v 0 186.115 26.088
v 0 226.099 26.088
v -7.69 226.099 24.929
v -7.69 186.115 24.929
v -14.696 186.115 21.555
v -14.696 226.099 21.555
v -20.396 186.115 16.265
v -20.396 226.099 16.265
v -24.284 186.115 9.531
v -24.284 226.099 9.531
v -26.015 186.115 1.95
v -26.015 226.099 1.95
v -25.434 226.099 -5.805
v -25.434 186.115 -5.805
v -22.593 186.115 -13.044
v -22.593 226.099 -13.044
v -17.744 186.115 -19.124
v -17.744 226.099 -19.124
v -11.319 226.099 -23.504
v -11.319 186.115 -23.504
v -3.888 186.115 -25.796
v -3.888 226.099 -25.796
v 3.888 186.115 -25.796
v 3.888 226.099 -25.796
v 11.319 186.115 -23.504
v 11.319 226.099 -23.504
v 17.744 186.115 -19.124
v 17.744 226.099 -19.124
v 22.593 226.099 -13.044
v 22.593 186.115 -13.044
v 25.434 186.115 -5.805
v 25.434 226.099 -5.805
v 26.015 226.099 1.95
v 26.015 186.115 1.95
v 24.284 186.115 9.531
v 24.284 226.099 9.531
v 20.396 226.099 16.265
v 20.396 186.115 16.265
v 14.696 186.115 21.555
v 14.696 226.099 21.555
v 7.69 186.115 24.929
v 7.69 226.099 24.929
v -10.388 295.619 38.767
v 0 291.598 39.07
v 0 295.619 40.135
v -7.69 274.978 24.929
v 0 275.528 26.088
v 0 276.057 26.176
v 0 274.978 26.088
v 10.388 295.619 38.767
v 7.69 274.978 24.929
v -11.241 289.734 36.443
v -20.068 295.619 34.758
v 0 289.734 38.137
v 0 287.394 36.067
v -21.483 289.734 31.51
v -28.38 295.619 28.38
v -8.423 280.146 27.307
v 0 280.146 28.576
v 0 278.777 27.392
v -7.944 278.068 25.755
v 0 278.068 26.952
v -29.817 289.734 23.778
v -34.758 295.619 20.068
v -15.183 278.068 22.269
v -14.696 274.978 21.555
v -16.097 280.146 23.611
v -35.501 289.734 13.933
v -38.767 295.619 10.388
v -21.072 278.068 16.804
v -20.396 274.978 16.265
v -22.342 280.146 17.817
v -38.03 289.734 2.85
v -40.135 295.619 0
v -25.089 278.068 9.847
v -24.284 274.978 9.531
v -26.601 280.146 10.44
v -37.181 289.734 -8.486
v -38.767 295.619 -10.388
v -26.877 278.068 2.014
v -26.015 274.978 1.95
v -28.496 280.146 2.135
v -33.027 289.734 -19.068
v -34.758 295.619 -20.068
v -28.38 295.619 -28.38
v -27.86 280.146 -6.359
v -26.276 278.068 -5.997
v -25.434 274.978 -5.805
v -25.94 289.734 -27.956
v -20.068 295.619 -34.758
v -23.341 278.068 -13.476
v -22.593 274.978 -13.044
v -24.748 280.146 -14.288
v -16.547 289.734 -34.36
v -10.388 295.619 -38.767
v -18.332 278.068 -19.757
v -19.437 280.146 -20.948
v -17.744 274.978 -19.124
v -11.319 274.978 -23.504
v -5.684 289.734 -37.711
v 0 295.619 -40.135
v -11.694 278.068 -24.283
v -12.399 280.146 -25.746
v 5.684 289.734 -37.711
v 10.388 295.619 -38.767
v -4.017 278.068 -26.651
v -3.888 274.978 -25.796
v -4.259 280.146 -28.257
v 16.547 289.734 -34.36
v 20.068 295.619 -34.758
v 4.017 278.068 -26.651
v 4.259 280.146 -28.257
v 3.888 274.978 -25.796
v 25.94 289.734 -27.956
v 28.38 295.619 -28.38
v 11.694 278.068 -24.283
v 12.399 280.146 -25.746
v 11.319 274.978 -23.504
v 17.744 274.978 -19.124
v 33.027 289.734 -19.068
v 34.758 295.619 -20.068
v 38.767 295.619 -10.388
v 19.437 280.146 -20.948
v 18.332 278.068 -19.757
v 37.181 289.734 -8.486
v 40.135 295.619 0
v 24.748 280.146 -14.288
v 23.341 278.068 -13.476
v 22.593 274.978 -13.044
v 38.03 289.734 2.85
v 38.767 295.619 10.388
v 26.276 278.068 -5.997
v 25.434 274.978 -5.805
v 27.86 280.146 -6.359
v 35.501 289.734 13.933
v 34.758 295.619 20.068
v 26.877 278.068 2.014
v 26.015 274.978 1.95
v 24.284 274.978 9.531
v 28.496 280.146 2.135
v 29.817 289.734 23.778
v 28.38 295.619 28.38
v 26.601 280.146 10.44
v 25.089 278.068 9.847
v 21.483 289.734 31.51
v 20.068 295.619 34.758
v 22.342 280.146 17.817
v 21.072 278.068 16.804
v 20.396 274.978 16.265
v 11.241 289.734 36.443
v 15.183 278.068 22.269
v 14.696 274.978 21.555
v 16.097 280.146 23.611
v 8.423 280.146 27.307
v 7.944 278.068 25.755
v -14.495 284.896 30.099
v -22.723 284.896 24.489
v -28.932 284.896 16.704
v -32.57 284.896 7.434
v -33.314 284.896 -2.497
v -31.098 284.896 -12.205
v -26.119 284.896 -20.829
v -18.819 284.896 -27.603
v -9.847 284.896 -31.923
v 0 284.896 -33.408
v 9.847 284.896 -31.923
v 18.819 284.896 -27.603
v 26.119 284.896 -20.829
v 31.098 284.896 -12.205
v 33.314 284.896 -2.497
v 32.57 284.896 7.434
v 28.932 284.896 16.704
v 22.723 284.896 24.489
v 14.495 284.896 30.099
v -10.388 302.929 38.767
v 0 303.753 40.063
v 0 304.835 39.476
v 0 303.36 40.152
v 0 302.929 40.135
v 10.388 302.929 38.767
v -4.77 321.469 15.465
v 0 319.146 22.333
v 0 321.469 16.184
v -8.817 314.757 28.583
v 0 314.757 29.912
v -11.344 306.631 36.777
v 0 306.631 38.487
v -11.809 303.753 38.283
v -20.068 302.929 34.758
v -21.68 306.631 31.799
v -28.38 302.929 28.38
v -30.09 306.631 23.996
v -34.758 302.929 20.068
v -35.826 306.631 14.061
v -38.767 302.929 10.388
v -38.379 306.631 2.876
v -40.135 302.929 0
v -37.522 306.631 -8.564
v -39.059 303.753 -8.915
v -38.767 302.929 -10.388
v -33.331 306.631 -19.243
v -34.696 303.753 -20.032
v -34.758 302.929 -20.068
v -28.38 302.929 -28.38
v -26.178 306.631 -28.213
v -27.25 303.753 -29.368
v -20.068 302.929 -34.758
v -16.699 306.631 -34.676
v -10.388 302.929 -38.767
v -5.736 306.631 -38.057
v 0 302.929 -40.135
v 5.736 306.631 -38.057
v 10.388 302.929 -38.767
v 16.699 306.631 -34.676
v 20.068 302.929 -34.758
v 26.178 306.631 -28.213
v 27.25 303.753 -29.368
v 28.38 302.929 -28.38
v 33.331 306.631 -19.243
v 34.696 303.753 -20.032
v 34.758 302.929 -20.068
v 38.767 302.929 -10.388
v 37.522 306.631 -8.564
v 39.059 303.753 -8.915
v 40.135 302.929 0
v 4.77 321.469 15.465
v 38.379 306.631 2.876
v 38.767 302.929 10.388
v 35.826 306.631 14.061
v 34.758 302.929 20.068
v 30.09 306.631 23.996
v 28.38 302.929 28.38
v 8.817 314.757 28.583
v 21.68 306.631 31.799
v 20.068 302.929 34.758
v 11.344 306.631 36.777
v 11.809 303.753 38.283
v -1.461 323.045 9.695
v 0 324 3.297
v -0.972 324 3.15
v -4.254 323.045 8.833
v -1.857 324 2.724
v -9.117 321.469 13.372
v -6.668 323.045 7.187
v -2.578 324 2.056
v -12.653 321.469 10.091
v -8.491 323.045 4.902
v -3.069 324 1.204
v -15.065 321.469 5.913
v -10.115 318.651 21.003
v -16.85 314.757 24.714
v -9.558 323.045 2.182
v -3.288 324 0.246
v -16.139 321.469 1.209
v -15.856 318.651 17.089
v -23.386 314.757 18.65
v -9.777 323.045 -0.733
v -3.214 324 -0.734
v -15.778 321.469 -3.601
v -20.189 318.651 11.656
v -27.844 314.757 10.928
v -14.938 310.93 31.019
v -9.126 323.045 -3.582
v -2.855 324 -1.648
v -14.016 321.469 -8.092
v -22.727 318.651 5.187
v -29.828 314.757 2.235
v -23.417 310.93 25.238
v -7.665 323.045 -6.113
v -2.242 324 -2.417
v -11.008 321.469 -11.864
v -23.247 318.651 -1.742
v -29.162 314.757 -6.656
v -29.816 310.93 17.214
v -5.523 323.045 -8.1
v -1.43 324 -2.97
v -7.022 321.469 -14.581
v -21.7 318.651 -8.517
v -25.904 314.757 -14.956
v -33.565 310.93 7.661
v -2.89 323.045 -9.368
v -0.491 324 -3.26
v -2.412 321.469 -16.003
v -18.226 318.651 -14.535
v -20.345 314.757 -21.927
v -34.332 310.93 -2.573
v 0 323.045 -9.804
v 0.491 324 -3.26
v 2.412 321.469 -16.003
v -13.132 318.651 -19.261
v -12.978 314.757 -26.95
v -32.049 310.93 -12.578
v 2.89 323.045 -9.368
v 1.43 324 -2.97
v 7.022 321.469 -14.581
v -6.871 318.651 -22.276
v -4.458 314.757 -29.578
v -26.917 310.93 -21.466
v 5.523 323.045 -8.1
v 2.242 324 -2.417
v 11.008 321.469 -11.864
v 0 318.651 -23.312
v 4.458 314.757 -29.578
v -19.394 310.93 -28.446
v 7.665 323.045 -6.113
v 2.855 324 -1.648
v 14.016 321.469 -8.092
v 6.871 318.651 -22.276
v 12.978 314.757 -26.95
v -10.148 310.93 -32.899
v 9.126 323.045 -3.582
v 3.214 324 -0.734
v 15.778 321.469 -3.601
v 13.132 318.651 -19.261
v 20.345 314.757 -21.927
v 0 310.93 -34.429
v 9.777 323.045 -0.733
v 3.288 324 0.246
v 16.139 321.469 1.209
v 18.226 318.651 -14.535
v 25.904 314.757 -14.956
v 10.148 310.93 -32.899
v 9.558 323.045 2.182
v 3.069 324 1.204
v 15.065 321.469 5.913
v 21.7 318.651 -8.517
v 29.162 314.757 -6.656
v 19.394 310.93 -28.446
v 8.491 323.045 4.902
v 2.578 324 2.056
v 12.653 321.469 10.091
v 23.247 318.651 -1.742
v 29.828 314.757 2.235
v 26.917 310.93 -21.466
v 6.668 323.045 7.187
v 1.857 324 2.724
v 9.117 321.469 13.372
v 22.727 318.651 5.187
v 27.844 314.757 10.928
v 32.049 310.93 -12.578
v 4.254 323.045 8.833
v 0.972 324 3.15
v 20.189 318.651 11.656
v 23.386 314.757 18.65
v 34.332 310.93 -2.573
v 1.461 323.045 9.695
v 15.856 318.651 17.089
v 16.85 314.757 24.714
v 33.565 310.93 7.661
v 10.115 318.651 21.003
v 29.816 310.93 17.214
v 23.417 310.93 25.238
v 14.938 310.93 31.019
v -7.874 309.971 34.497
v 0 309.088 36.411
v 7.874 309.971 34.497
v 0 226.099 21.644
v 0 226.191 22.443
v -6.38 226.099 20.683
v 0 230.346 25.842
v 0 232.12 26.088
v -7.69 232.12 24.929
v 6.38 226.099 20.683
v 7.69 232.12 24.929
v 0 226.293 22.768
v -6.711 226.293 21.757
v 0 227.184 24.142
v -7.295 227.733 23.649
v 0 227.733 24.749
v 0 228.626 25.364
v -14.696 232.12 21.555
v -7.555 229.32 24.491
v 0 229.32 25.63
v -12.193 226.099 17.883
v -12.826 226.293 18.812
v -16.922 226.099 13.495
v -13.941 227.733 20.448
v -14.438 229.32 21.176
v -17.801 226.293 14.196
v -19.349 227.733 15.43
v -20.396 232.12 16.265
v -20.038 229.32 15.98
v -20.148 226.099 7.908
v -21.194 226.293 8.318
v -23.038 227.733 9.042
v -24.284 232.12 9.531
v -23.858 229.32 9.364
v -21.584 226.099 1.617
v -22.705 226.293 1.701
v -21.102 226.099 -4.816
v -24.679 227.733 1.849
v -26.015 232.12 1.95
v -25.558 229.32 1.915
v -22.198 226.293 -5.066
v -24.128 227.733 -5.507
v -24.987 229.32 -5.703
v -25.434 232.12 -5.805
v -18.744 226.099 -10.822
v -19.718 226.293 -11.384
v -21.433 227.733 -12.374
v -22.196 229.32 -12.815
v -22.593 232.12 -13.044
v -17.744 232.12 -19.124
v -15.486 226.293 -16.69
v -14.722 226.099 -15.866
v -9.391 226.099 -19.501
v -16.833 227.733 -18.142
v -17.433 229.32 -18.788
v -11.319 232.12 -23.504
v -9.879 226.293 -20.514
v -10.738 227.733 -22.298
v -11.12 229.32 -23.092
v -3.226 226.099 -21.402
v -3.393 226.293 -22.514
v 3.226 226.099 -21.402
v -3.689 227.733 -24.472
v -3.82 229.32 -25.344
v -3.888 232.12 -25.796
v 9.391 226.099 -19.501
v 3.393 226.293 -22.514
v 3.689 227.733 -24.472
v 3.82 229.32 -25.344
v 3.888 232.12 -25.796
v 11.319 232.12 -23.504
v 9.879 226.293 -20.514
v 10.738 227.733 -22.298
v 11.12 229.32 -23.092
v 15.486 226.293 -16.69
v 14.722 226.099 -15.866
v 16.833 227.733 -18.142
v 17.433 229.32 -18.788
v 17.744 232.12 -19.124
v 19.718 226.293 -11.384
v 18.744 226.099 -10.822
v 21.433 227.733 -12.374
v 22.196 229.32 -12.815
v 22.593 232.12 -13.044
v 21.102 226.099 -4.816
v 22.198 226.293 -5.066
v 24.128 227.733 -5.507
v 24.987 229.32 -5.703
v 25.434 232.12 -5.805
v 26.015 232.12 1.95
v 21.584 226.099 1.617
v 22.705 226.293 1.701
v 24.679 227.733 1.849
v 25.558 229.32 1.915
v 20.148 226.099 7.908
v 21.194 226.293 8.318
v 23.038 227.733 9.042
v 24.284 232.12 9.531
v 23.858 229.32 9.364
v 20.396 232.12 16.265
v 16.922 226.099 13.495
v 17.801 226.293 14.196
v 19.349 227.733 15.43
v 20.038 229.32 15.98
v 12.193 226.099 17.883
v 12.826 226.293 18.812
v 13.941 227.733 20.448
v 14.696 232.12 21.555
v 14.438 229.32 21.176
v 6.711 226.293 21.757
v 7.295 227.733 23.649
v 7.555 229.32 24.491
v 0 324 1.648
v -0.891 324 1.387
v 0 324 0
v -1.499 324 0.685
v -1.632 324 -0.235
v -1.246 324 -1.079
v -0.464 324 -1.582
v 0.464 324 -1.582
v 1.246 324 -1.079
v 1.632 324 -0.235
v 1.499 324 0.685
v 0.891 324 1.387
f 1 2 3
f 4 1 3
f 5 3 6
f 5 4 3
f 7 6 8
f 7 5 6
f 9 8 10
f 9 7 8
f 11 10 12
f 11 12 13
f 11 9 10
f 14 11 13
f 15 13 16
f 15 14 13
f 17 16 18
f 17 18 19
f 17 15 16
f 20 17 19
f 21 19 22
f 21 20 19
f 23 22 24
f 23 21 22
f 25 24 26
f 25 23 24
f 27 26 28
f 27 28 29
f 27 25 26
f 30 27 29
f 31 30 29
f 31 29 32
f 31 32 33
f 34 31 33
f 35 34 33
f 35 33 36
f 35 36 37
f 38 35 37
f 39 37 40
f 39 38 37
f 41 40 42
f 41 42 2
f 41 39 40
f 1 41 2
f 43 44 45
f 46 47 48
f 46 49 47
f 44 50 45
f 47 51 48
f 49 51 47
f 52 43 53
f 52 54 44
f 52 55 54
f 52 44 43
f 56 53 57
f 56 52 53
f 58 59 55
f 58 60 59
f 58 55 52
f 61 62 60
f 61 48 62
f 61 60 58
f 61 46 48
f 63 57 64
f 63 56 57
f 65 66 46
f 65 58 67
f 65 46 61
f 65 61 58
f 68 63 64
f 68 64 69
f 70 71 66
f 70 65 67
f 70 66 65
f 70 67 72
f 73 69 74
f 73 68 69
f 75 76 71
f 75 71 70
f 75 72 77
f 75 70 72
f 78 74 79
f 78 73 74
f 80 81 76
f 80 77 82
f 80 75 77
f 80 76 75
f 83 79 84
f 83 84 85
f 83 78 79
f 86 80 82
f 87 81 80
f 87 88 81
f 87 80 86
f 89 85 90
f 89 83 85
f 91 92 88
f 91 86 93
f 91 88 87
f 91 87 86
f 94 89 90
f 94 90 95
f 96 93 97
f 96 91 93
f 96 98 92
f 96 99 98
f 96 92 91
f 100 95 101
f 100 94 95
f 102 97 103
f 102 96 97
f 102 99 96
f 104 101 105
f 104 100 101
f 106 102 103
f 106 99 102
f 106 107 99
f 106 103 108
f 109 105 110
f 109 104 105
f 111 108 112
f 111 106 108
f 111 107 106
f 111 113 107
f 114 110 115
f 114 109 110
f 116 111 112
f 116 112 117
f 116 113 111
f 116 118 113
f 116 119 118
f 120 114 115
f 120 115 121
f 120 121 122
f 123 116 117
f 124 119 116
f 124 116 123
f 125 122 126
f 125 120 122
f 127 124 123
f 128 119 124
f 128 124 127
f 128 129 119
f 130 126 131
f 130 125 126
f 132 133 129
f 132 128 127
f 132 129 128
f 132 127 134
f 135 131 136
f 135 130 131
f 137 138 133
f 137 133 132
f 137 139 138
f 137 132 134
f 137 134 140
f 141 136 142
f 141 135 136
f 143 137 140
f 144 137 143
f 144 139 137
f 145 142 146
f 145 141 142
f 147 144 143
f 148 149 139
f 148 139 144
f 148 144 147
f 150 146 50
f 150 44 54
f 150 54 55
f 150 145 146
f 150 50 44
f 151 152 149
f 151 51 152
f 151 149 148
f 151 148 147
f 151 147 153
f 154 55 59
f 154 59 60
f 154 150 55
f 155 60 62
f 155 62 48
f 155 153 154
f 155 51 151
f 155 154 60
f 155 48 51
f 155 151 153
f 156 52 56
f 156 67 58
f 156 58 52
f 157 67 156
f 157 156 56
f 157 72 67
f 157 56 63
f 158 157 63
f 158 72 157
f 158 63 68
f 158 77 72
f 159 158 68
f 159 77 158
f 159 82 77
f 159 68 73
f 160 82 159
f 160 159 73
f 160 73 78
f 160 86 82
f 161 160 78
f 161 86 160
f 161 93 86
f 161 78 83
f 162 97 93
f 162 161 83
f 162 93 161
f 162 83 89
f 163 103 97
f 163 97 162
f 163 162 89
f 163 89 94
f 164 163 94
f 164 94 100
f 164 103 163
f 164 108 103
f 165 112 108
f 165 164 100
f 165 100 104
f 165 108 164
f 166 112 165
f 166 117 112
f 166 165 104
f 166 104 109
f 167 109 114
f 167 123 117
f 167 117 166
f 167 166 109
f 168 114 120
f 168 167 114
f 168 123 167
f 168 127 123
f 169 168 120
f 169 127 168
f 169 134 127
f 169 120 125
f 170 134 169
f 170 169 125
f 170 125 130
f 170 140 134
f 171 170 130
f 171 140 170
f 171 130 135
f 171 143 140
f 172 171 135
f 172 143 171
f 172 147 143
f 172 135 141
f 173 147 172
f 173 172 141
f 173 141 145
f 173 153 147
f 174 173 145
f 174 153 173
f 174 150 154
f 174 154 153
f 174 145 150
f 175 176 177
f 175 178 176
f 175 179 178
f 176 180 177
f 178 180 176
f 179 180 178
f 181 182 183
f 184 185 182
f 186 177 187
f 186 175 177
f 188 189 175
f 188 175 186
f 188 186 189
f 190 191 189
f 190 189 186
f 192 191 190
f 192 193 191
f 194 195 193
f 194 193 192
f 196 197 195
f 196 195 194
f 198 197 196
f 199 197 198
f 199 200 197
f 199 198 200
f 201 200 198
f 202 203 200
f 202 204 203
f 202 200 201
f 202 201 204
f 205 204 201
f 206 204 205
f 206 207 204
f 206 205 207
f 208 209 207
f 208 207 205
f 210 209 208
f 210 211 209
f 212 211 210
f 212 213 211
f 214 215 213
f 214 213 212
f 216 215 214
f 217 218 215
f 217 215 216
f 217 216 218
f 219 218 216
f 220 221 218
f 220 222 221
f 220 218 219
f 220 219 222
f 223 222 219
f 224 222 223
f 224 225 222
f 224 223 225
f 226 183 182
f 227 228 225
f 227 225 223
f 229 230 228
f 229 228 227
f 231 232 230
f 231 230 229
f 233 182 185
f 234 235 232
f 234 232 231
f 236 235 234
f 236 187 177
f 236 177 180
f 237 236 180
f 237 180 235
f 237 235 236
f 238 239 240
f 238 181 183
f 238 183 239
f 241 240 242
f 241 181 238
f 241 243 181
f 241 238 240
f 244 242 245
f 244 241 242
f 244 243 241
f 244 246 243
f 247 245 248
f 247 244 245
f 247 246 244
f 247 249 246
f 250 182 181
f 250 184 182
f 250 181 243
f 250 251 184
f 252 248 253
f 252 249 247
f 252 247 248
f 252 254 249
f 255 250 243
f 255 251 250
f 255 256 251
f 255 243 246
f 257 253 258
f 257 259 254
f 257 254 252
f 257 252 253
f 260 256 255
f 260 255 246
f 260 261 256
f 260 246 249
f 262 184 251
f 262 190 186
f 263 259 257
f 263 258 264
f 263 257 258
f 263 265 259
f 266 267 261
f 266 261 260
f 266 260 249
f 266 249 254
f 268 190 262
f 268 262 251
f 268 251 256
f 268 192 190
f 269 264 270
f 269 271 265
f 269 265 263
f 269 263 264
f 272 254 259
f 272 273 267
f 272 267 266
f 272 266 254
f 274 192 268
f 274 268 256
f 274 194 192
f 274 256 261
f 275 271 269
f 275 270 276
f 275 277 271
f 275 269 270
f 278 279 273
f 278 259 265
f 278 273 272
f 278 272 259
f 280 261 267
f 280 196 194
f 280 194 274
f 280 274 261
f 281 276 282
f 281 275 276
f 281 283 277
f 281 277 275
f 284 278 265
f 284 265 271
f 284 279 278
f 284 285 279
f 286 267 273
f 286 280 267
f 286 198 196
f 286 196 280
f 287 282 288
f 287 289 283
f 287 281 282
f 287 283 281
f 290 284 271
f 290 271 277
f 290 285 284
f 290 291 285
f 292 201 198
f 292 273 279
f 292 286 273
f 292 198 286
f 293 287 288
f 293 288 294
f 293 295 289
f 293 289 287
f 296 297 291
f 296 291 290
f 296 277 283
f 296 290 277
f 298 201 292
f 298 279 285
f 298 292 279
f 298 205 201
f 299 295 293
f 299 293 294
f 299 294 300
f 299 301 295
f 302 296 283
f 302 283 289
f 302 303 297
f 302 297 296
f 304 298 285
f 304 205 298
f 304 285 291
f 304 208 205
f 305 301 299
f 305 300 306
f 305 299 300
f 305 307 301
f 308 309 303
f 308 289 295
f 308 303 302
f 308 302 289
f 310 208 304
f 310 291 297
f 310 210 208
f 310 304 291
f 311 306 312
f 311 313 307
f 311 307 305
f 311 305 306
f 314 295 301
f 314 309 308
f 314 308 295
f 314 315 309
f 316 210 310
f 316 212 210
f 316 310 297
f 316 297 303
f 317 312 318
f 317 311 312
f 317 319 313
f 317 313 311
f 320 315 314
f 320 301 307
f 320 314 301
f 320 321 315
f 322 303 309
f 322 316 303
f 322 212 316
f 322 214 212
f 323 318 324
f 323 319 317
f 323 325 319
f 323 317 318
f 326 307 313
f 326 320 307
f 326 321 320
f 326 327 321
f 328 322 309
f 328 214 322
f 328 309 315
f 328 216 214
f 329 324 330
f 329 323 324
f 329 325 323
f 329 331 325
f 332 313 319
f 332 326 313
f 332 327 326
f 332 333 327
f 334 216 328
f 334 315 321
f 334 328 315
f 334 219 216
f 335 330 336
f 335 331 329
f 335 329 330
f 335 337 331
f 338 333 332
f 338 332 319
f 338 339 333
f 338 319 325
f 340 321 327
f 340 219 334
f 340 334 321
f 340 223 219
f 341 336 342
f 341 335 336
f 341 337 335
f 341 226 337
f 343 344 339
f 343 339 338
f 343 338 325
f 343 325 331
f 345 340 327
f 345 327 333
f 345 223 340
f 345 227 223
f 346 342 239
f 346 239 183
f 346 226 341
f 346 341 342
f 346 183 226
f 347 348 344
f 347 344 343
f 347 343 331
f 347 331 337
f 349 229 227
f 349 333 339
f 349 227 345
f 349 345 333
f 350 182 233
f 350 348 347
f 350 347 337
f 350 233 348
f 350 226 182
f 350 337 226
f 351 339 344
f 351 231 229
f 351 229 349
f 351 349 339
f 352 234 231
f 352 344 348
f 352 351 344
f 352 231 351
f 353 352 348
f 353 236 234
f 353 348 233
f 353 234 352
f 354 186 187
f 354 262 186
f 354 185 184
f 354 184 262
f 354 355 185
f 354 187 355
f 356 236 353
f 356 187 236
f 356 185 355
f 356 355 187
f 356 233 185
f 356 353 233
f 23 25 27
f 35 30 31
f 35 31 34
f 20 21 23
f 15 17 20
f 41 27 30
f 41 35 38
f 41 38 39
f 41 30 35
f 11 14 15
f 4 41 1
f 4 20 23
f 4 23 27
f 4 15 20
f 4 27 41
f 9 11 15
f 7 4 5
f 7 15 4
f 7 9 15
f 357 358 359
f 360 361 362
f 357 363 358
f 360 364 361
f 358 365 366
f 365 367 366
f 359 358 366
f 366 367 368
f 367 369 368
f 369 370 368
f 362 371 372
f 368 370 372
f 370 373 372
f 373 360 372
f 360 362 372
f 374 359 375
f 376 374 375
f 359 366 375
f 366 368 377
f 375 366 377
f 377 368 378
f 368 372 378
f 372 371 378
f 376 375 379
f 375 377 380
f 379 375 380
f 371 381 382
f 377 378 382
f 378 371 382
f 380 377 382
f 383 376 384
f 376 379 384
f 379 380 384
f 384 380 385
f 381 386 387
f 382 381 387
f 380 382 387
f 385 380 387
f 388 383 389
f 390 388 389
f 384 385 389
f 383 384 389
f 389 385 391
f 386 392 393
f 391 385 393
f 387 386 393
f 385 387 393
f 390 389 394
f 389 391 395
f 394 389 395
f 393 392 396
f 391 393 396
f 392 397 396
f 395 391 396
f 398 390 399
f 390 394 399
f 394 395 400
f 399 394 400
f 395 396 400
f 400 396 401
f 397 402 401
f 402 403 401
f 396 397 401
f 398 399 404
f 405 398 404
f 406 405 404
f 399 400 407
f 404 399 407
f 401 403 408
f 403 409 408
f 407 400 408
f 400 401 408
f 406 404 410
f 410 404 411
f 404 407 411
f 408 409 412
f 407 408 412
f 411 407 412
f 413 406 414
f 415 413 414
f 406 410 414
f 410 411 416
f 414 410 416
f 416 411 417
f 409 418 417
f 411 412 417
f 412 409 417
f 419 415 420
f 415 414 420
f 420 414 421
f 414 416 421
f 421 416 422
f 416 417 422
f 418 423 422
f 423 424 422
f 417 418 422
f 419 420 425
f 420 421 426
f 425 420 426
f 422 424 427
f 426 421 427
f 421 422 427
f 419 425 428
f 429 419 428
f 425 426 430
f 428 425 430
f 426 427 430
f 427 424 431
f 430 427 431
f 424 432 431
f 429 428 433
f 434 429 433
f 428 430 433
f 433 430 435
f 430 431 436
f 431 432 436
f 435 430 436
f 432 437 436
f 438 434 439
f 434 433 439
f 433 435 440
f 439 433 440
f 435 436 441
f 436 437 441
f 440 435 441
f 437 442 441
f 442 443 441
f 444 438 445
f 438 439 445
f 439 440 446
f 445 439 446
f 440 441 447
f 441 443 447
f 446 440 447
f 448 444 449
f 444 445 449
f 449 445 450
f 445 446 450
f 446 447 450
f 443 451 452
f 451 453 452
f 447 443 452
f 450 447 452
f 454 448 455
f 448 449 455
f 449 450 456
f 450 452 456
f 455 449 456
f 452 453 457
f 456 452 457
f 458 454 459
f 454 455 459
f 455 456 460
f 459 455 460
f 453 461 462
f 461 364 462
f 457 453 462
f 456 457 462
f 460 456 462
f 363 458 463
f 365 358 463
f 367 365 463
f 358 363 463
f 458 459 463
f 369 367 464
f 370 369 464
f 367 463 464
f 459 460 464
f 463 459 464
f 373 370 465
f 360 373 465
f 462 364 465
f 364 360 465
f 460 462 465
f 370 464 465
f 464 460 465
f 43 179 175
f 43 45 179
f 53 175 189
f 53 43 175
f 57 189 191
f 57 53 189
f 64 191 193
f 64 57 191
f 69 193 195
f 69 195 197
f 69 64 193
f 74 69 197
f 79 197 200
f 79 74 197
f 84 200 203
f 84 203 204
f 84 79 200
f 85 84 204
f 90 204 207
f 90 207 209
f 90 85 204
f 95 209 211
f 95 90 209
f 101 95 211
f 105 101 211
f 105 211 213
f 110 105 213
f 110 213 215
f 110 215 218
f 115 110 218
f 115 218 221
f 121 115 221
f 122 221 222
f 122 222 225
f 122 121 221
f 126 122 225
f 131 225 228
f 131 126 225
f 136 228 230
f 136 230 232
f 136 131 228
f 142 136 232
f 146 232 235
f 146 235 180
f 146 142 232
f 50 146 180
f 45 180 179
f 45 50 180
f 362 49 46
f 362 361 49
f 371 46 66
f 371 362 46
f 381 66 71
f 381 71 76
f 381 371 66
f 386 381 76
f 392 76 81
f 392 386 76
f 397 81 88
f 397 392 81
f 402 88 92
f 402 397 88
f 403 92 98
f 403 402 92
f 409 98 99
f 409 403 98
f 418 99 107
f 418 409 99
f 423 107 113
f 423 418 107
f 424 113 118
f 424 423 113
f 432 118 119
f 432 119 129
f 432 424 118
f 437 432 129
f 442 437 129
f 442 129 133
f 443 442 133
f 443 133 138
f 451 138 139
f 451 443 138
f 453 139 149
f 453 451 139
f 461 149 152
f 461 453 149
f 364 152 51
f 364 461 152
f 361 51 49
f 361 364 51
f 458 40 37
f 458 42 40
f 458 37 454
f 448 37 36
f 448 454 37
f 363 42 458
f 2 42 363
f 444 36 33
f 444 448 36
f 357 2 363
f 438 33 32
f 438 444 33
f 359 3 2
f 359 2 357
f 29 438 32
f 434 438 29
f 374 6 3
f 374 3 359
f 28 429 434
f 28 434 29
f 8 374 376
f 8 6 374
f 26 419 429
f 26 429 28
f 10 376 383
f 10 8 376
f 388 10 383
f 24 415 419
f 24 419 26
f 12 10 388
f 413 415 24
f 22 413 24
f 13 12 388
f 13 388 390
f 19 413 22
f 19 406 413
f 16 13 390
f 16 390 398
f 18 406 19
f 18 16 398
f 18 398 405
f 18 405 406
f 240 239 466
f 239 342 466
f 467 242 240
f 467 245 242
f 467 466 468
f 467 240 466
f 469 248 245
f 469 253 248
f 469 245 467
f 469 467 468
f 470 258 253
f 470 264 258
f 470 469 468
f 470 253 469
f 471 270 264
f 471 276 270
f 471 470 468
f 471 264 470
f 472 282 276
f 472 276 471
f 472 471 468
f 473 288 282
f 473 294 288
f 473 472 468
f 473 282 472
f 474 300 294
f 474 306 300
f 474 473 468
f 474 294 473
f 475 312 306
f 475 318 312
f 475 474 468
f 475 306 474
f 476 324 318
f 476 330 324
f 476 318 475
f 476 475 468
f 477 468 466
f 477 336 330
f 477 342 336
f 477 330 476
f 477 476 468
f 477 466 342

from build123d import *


with BuildPart() as part:
    # Sketch1 → Revolve5 (revolve)
    with BuildSketch(Plane(origin=(0, 0, 0), x_dir=(0, 0, -1), z_dir=(1, 0, 0)), mode=Mode.PRIVATE) as revolve5_sk:
        with BuildLine():
            Line((26.0877562, 274.977978152), (26.0877562, 232.119517882))
            add(Edge.make_bspline(
                [(21.644222638, 226.099267925), (21.958350781, 226.150905548), (22.404904398, 226.152975164), (22.895958822, 226.332084554), (23.440030786, 226.749372055), (24.24430563, 227.201358343), (25.006598671, 227.972439803), (25.579605023, 228.952220985), (25.862222604, 230.393042058), (26.02282064, 231.443642052), (26.0877562, 232.119517882)],
                knots=[0, 0, 0, 0, 0.091924004, 0.112491347, 0.205673428, 0.333713758, 0.459267324, 0.60242293, 0.748839041, 1, 1, 1, 1], degree=3))
            Line((21.644222638, 226.099267925), (26.0877562, 226.099267925))
            Line((26.0877562, 226.099267925), (26.0877562, 186.115239509))
            Line((26.0877562, 186.115239509), (0, 186.115239509))
            Line((0, 186.115239509), (0, 324))
            Line((0, 324), (3.296807109, 324.000001326))
            add(Edge.make_bspline(
                [(3.296807109, 324.000001326), (4.197169533, 323.839631011), (5.699030772, 323.815957427), (7.693496909, 323.429691693), (9.272215479, 323.156322342), (10.750690756, 322.85377071), (12.181632664, 322.557718535), (13.637151846, 322.313021034), (14.864343001, 321.911666772), (15.911496119, 321.566233217), (16.810008215, 321.249118961), (17.733867067, 321.014944924), (18.837916963, 320.64163427), (19.930975123, 320.193493737), (21.068588771, 319.694847201), (22.140955467, 319.262699902), (23.215588995, 318.685639732), (24.437095613, 318.116319481), (25.676203543, 317.35184267), (27.106557761, 316.751797909), (28.431792952, 315.783230305), (29.732159344, 314.893883423), (31.057969832, 313.930025749), (32.195938479, 312.858119022), (33.337791918, 311.850348536), (34.453883476, 310.964611829), (35.389537529, 309.886673636), (36.507817894, 309.094911082), (37.294189805, 308.020839774), (38.123272117, 307.123784158), (38.90481731, 306.096129676), (39.472447784, 304.634911321), (40.277373116, 303.734041187), (40.135001067, 302.929125624)],
                knots=[0, 0, 0, 0, 0.061584866, 0.100794934, 0.136830737, 0.169700169, 0.202568951, 0.235437772, 0.269088289, 0.28947253, 0.309858246, 0.333318895, 0.353706299, 0.388422524, 0.412964696, 0.437513728, 0.466339543, 0.495168077, 0.528353595, 0.56438738, 0.599250154, 0.638593117, 0.670823767, 0.709635236, 0.743897498, 0.773611537, 0.805518574, 0.839782544, 0.864952923, 0.894669658, 0.922394752, 0.951224044, 1, 1, 1, 1], degree=3))
            Line((40.135001067, 302.929125624), (40.135001067, 295.618823674))
            add(Edge.make_bspline(
                [(40.135001067, 295.618823674), (39.963585575, 294.713139617), (39.786893551, 293.368854611), (39.10947692, 291.690071062), (38.601855291, 290.459886772), (37.841755018, 289.239215664), (36.919500435, 288.227943295), (35.923208467, 287.26510185), (34.974047306, 286.251458489), (33.831062374, 285.346264323), (32.823255368, 284.296585872), (31.870131948, 283.286750944), (30.766815667, 282.438718878), (29.874182206, 281.464372876), (28.860414421, 280.515150439), (28.056699811, 279.511909602), (27.143781617, 278.556908896), (26.496830662, 277.02873066), (26.008069584, 275.856710536), (26.0877562, 274.977978152)],
                knots=[0, 0, 0, 0, 0.108355708, 0.156009902, 0.210945136, 0.263562196, 0.322855399, 0.37018587, 0.425399507, 0.484692346, 0.539908976, 0.595125988, 0.646549262, 0.701764349, 0.749092889, 0.808384474, 0.85194968, 0.901837269, 1, 1, 1, 1], degree=3))
        make_face()
    revolve(revolve5_sk.sketch.rotate(Axis((0, 324, 0), (0, -1, 0)), 180), axis=Axis((0, 324, 0), (0, -1, 0)))


solid = part.part
